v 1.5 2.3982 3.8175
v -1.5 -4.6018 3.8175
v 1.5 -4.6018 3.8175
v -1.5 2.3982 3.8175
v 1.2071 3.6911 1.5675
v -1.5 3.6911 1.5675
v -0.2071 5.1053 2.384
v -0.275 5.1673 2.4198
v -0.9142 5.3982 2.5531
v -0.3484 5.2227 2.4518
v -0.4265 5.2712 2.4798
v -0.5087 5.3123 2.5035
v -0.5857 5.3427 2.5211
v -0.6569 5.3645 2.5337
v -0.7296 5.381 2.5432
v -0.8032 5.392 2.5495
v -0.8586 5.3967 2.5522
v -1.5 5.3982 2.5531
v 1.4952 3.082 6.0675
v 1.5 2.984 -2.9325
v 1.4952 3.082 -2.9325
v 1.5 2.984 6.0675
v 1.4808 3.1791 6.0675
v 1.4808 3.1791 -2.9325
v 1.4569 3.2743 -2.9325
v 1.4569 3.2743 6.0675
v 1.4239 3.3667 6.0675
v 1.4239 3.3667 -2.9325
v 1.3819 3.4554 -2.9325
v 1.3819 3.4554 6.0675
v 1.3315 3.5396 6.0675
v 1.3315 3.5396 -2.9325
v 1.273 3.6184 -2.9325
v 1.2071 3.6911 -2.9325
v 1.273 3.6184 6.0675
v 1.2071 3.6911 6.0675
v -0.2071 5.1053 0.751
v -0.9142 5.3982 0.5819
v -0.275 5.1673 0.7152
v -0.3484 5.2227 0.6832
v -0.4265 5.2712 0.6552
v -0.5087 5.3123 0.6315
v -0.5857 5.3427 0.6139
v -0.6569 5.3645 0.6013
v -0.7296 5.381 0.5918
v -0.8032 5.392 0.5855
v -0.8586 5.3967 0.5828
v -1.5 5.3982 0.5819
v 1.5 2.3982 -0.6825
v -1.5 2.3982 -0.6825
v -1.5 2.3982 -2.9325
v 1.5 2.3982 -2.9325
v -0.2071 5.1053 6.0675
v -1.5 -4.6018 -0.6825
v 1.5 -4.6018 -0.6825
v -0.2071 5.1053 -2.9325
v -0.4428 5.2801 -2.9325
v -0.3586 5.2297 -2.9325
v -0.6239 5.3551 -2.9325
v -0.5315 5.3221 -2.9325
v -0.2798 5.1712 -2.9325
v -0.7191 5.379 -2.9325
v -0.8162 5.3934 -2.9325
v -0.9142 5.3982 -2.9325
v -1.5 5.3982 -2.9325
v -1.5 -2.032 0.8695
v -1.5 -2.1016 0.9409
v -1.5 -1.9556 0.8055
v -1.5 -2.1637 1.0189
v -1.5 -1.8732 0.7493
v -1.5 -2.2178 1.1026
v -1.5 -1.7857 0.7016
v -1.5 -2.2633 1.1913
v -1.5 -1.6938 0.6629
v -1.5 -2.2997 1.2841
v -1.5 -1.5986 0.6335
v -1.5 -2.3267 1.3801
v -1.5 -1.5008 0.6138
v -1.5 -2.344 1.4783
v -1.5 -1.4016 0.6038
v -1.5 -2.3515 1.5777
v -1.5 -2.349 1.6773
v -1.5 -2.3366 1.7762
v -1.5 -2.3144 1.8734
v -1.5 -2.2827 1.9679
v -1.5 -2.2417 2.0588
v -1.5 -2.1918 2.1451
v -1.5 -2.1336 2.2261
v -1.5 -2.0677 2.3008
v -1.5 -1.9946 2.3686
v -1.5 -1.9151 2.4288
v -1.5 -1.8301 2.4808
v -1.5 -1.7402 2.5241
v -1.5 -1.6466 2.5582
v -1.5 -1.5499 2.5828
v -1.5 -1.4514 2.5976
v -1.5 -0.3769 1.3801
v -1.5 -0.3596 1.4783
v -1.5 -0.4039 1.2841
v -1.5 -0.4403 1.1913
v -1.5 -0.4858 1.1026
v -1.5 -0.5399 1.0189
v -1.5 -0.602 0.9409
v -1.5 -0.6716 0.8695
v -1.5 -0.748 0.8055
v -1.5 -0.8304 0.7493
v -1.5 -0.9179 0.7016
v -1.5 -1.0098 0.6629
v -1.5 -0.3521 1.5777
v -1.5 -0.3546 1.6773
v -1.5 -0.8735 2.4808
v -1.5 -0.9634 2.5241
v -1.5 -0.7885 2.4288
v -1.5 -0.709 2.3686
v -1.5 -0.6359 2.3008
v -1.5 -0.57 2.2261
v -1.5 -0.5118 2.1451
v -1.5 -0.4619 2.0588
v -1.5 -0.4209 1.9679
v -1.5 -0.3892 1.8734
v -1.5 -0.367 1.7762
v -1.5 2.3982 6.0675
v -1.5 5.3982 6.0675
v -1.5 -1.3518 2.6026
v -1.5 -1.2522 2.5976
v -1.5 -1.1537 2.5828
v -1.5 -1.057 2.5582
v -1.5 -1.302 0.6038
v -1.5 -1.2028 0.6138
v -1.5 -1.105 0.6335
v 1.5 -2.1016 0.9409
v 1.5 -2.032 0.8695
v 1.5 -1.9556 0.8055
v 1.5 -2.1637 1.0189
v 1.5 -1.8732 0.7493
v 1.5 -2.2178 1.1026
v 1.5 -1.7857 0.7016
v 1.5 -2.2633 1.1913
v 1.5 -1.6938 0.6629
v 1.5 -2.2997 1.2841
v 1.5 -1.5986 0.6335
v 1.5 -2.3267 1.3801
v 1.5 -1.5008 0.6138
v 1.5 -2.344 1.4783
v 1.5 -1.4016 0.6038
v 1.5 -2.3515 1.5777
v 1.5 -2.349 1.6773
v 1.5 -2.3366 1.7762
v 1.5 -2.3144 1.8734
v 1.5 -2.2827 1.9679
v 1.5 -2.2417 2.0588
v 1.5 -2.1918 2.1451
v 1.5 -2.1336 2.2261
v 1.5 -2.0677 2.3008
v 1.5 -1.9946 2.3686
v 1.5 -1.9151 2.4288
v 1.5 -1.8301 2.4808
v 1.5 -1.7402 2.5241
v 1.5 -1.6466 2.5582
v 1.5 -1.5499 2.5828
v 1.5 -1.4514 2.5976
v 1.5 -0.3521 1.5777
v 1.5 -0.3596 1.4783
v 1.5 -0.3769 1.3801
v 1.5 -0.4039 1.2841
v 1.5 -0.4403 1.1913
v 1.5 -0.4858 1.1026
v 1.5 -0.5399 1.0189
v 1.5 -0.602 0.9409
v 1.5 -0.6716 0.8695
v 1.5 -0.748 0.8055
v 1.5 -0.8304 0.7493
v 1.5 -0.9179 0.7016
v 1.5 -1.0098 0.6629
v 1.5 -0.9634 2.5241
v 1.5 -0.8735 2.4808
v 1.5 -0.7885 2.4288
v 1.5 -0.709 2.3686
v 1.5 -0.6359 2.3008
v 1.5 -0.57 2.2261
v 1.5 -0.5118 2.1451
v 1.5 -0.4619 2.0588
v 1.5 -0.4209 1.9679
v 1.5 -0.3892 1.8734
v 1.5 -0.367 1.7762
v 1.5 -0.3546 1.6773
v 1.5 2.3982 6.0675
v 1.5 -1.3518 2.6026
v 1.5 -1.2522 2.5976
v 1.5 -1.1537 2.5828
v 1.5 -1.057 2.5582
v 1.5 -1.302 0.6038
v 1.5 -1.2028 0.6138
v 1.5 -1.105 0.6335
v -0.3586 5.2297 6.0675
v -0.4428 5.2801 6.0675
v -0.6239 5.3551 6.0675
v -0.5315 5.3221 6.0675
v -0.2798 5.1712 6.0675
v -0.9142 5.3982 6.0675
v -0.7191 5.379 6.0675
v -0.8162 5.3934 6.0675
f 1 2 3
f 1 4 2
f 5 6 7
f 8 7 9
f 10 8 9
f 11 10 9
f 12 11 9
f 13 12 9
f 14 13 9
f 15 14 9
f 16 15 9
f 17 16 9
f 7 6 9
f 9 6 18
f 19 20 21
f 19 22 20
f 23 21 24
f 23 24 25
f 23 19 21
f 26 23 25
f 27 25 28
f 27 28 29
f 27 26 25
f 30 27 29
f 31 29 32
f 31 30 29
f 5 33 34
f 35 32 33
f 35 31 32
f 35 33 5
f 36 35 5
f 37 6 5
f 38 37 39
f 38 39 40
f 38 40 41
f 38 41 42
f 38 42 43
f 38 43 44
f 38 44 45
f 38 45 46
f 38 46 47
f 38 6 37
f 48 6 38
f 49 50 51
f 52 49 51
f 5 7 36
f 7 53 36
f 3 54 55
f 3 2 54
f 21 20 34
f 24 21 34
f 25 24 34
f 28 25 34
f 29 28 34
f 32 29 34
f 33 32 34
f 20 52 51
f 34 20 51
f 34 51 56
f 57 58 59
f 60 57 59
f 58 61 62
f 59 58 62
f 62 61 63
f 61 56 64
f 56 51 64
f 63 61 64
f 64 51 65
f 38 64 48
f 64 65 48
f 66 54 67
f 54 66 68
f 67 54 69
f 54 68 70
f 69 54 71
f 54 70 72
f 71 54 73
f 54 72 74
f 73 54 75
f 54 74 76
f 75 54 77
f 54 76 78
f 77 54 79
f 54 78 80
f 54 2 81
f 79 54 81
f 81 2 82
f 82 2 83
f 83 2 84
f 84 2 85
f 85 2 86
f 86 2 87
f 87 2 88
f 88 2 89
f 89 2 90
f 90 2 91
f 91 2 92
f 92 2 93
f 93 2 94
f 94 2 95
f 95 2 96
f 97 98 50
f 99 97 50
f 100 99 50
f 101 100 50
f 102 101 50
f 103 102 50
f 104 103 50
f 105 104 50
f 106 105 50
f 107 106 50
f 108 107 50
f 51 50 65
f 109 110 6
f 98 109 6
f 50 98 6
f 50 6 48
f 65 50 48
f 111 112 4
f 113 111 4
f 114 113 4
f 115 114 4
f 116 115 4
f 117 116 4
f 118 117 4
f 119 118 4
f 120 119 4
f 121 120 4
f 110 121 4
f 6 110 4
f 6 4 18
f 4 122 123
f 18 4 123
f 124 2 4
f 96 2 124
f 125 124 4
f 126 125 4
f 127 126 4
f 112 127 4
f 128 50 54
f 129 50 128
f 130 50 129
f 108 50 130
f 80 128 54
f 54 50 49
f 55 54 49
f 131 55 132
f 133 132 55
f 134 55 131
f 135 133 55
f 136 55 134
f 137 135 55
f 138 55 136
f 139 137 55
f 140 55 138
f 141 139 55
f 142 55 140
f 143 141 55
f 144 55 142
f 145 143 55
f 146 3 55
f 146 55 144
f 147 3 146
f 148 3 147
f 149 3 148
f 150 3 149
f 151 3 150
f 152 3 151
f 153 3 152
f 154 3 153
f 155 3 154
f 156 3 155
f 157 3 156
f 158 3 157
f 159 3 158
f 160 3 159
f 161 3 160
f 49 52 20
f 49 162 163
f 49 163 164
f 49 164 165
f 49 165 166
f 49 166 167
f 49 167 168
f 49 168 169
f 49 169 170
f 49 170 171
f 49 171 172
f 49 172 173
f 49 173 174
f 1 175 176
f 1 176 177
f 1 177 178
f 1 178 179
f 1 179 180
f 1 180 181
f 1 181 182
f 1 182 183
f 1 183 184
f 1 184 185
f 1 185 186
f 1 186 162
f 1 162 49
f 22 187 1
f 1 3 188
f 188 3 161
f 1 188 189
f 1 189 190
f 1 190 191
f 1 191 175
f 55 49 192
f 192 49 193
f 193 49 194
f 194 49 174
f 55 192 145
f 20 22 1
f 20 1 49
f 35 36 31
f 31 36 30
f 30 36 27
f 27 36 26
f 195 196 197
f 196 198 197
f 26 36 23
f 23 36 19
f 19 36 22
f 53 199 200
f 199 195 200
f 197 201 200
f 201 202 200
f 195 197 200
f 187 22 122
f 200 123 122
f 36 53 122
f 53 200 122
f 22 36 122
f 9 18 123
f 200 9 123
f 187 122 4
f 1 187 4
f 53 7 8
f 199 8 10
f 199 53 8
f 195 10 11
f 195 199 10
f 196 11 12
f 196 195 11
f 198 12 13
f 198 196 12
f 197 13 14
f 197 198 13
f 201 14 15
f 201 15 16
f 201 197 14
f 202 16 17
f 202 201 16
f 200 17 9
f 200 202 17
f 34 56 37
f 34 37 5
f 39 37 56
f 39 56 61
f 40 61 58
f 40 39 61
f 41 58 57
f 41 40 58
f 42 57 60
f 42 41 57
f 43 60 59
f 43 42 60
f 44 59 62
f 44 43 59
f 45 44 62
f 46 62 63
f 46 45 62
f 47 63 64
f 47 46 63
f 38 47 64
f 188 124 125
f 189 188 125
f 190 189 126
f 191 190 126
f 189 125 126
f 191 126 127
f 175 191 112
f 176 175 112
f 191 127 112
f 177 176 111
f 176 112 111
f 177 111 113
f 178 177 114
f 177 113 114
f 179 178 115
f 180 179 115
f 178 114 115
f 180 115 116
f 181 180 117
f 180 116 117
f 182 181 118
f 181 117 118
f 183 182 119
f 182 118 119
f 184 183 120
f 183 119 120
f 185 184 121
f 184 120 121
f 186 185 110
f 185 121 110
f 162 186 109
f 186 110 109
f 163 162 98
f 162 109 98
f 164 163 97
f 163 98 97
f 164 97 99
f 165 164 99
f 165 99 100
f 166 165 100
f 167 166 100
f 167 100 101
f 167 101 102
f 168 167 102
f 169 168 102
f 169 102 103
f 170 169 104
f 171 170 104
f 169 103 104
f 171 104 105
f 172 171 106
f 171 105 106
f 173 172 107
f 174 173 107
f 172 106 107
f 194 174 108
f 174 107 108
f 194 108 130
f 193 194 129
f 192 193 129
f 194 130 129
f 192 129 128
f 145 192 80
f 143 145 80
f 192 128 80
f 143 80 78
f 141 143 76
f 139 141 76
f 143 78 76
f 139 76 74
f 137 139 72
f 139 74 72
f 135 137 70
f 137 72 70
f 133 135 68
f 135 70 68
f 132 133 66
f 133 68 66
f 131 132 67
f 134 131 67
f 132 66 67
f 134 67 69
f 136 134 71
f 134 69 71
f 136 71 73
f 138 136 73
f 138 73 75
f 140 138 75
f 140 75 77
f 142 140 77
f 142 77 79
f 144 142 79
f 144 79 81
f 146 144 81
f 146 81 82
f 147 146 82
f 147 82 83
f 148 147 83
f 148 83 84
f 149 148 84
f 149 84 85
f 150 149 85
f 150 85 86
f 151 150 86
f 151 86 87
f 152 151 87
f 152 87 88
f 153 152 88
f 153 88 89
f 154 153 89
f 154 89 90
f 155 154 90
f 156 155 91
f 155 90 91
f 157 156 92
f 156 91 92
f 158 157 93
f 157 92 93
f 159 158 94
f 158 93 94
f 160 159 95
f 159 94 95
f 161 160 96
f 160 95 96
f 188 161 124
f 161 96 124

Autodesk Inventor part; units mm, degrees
ref_plane "YZ Plane" through (0, 0, 0) normal (1, 0, 0) x (0, 1, 0)
ref_plane "XZ Plane" through (0, 0, 0) normal (0, 1, 0) x (-1, 0, 0)
ref_plane "XY Plane" through (0, 0, 0) normal (0, 0, 1) x (1, 0, 0)
sketch "Sketch1" plane through (0, 0, 0) normal (1, 0, 0) x (0, 1, 0)
  line L0 (5.3982, 6.0675) -> (2.3982, 6.0675)
  line L1 (2.3982, 6.0675) -> (2.3982, -2.9325)
  line L2 (2.3982, -2.9325) -> (5.3982, -2.9325)
  line L3 (5.3982, -2.9325) -> (5.3982, 6.0675)
  point P0 (0, 0)
  dimension "d0" = 3
  dimension "d1" = 9
extrude "Extrusion1" add sketch "Sketch1" along normal mid plane 3
sketch "Sketch2" plane through (-1.5, 2.3982, 6.0675) normal (0, 0, 1) x (1, 0, 0)
  line L0 (0, 3) -> (3, 3) projected
  line L1 (0, 3) -> (0.5858, 3)
  line L2 (3, 3) -> (3, 0) projected
  line L3 (3, 0) -> (3, 0.5858)
  line L4 (1.2929, 2.7071) -> (2.7071, 1.2929)
  arc A0 (1.2929, 2.7071) -> (0.5858, 3) centre (0.5858, 2) ccw
  arc A1 (3, 0.5858) -> (2.7071, 1.2929) centre (2, 0.5858) ccw
  line L5 (0.5858, 3) -> (3, 3)
  arc A2 (1.2929, 2.7071) -> (0.5858, 3) centre (0.5858, 2) ccw
  arc A3 (3, 0.5858) -> (2.7071, 1.2929) centre (2, 0.5858) ccw
  line L6 (3, 3) -> (3, 0.5858)
  point P0 (1.5, -2.3982)
  point P1 (1, 3)
  point P2 (3, 1)
  dimension "d5" = 1
extrude "Extrusion2" cut sketch "Sketch2" against normal blind 50
sketch "Sketch4" plane through (-1.5, 0, 0) normal (-1, 0, 0) x (0, 0, 1)
  line L0 (6.0675, 5.3982) -> (-2.9325, 5.3982) projected
  line L1 (6.0675, 2.3982) -> (-2.9325, 2.3982) projected
  line L2 (6.0675, 3.6911) -> (-2.9325, 3.6911) projected
  line L3 (1.5675, 3.6911) -> (2.5531, 5.3982)
  line L4 (1.5675, 3.6911) -> (3.5387, 3.6911) construction
  line L5 (1.5675, 3.6911) -> (0.5819, 5.3982)
  line L6 (0.5819, 5.3982) -> (2.5531, 5.3982)
  point P0 (0, 0)
  dimension "d10" = 60
extrude "Extrusion3" cut sketch "Sketch4" against normal blind 50
sketch "Sketch5" plane through (-1.5, 2.3982, -2.9325) normal (0, -1, 0) x (1, 0, 0)
  line L0 (3, 9) -> (3, 0) projected
  line L1 (0, 0) -> (0, 9) projected
  line L2 (0, 6.75) -> (3, 6.75)
  line L3 (0, 2.25) -> (3, 2.25)
  line L4 (0, 2.25) -> (0, 6.75)
  line L5 (3, 2.25) -> (3, 6.75)
  point P0 (1.5, 2.9325)
  point P1 (0, 4.5)
extrude "Extrusion4" add sketch "Sketch5" along normal blind 7
sketch "Sketch7" plane through (-1.5, 0, 0) normal (-1, 0, 0) x (0, 0, 1)
  line L0 (-2.9325, 2.3982) -> (-0.6825, 2.3982) projected
  circle A0 centre (1.6026, -1.3518) radius 1
  point P0 (0.6868, -0.5794)
extrude "Extrusion5" cut sketch "Sketch7" against normal blind 3
thread "Thread1" size "M2x0.25" class "6H" standard "ANSI Metric M Profile" full length
properties part number "Apoio móvel da ponte"
